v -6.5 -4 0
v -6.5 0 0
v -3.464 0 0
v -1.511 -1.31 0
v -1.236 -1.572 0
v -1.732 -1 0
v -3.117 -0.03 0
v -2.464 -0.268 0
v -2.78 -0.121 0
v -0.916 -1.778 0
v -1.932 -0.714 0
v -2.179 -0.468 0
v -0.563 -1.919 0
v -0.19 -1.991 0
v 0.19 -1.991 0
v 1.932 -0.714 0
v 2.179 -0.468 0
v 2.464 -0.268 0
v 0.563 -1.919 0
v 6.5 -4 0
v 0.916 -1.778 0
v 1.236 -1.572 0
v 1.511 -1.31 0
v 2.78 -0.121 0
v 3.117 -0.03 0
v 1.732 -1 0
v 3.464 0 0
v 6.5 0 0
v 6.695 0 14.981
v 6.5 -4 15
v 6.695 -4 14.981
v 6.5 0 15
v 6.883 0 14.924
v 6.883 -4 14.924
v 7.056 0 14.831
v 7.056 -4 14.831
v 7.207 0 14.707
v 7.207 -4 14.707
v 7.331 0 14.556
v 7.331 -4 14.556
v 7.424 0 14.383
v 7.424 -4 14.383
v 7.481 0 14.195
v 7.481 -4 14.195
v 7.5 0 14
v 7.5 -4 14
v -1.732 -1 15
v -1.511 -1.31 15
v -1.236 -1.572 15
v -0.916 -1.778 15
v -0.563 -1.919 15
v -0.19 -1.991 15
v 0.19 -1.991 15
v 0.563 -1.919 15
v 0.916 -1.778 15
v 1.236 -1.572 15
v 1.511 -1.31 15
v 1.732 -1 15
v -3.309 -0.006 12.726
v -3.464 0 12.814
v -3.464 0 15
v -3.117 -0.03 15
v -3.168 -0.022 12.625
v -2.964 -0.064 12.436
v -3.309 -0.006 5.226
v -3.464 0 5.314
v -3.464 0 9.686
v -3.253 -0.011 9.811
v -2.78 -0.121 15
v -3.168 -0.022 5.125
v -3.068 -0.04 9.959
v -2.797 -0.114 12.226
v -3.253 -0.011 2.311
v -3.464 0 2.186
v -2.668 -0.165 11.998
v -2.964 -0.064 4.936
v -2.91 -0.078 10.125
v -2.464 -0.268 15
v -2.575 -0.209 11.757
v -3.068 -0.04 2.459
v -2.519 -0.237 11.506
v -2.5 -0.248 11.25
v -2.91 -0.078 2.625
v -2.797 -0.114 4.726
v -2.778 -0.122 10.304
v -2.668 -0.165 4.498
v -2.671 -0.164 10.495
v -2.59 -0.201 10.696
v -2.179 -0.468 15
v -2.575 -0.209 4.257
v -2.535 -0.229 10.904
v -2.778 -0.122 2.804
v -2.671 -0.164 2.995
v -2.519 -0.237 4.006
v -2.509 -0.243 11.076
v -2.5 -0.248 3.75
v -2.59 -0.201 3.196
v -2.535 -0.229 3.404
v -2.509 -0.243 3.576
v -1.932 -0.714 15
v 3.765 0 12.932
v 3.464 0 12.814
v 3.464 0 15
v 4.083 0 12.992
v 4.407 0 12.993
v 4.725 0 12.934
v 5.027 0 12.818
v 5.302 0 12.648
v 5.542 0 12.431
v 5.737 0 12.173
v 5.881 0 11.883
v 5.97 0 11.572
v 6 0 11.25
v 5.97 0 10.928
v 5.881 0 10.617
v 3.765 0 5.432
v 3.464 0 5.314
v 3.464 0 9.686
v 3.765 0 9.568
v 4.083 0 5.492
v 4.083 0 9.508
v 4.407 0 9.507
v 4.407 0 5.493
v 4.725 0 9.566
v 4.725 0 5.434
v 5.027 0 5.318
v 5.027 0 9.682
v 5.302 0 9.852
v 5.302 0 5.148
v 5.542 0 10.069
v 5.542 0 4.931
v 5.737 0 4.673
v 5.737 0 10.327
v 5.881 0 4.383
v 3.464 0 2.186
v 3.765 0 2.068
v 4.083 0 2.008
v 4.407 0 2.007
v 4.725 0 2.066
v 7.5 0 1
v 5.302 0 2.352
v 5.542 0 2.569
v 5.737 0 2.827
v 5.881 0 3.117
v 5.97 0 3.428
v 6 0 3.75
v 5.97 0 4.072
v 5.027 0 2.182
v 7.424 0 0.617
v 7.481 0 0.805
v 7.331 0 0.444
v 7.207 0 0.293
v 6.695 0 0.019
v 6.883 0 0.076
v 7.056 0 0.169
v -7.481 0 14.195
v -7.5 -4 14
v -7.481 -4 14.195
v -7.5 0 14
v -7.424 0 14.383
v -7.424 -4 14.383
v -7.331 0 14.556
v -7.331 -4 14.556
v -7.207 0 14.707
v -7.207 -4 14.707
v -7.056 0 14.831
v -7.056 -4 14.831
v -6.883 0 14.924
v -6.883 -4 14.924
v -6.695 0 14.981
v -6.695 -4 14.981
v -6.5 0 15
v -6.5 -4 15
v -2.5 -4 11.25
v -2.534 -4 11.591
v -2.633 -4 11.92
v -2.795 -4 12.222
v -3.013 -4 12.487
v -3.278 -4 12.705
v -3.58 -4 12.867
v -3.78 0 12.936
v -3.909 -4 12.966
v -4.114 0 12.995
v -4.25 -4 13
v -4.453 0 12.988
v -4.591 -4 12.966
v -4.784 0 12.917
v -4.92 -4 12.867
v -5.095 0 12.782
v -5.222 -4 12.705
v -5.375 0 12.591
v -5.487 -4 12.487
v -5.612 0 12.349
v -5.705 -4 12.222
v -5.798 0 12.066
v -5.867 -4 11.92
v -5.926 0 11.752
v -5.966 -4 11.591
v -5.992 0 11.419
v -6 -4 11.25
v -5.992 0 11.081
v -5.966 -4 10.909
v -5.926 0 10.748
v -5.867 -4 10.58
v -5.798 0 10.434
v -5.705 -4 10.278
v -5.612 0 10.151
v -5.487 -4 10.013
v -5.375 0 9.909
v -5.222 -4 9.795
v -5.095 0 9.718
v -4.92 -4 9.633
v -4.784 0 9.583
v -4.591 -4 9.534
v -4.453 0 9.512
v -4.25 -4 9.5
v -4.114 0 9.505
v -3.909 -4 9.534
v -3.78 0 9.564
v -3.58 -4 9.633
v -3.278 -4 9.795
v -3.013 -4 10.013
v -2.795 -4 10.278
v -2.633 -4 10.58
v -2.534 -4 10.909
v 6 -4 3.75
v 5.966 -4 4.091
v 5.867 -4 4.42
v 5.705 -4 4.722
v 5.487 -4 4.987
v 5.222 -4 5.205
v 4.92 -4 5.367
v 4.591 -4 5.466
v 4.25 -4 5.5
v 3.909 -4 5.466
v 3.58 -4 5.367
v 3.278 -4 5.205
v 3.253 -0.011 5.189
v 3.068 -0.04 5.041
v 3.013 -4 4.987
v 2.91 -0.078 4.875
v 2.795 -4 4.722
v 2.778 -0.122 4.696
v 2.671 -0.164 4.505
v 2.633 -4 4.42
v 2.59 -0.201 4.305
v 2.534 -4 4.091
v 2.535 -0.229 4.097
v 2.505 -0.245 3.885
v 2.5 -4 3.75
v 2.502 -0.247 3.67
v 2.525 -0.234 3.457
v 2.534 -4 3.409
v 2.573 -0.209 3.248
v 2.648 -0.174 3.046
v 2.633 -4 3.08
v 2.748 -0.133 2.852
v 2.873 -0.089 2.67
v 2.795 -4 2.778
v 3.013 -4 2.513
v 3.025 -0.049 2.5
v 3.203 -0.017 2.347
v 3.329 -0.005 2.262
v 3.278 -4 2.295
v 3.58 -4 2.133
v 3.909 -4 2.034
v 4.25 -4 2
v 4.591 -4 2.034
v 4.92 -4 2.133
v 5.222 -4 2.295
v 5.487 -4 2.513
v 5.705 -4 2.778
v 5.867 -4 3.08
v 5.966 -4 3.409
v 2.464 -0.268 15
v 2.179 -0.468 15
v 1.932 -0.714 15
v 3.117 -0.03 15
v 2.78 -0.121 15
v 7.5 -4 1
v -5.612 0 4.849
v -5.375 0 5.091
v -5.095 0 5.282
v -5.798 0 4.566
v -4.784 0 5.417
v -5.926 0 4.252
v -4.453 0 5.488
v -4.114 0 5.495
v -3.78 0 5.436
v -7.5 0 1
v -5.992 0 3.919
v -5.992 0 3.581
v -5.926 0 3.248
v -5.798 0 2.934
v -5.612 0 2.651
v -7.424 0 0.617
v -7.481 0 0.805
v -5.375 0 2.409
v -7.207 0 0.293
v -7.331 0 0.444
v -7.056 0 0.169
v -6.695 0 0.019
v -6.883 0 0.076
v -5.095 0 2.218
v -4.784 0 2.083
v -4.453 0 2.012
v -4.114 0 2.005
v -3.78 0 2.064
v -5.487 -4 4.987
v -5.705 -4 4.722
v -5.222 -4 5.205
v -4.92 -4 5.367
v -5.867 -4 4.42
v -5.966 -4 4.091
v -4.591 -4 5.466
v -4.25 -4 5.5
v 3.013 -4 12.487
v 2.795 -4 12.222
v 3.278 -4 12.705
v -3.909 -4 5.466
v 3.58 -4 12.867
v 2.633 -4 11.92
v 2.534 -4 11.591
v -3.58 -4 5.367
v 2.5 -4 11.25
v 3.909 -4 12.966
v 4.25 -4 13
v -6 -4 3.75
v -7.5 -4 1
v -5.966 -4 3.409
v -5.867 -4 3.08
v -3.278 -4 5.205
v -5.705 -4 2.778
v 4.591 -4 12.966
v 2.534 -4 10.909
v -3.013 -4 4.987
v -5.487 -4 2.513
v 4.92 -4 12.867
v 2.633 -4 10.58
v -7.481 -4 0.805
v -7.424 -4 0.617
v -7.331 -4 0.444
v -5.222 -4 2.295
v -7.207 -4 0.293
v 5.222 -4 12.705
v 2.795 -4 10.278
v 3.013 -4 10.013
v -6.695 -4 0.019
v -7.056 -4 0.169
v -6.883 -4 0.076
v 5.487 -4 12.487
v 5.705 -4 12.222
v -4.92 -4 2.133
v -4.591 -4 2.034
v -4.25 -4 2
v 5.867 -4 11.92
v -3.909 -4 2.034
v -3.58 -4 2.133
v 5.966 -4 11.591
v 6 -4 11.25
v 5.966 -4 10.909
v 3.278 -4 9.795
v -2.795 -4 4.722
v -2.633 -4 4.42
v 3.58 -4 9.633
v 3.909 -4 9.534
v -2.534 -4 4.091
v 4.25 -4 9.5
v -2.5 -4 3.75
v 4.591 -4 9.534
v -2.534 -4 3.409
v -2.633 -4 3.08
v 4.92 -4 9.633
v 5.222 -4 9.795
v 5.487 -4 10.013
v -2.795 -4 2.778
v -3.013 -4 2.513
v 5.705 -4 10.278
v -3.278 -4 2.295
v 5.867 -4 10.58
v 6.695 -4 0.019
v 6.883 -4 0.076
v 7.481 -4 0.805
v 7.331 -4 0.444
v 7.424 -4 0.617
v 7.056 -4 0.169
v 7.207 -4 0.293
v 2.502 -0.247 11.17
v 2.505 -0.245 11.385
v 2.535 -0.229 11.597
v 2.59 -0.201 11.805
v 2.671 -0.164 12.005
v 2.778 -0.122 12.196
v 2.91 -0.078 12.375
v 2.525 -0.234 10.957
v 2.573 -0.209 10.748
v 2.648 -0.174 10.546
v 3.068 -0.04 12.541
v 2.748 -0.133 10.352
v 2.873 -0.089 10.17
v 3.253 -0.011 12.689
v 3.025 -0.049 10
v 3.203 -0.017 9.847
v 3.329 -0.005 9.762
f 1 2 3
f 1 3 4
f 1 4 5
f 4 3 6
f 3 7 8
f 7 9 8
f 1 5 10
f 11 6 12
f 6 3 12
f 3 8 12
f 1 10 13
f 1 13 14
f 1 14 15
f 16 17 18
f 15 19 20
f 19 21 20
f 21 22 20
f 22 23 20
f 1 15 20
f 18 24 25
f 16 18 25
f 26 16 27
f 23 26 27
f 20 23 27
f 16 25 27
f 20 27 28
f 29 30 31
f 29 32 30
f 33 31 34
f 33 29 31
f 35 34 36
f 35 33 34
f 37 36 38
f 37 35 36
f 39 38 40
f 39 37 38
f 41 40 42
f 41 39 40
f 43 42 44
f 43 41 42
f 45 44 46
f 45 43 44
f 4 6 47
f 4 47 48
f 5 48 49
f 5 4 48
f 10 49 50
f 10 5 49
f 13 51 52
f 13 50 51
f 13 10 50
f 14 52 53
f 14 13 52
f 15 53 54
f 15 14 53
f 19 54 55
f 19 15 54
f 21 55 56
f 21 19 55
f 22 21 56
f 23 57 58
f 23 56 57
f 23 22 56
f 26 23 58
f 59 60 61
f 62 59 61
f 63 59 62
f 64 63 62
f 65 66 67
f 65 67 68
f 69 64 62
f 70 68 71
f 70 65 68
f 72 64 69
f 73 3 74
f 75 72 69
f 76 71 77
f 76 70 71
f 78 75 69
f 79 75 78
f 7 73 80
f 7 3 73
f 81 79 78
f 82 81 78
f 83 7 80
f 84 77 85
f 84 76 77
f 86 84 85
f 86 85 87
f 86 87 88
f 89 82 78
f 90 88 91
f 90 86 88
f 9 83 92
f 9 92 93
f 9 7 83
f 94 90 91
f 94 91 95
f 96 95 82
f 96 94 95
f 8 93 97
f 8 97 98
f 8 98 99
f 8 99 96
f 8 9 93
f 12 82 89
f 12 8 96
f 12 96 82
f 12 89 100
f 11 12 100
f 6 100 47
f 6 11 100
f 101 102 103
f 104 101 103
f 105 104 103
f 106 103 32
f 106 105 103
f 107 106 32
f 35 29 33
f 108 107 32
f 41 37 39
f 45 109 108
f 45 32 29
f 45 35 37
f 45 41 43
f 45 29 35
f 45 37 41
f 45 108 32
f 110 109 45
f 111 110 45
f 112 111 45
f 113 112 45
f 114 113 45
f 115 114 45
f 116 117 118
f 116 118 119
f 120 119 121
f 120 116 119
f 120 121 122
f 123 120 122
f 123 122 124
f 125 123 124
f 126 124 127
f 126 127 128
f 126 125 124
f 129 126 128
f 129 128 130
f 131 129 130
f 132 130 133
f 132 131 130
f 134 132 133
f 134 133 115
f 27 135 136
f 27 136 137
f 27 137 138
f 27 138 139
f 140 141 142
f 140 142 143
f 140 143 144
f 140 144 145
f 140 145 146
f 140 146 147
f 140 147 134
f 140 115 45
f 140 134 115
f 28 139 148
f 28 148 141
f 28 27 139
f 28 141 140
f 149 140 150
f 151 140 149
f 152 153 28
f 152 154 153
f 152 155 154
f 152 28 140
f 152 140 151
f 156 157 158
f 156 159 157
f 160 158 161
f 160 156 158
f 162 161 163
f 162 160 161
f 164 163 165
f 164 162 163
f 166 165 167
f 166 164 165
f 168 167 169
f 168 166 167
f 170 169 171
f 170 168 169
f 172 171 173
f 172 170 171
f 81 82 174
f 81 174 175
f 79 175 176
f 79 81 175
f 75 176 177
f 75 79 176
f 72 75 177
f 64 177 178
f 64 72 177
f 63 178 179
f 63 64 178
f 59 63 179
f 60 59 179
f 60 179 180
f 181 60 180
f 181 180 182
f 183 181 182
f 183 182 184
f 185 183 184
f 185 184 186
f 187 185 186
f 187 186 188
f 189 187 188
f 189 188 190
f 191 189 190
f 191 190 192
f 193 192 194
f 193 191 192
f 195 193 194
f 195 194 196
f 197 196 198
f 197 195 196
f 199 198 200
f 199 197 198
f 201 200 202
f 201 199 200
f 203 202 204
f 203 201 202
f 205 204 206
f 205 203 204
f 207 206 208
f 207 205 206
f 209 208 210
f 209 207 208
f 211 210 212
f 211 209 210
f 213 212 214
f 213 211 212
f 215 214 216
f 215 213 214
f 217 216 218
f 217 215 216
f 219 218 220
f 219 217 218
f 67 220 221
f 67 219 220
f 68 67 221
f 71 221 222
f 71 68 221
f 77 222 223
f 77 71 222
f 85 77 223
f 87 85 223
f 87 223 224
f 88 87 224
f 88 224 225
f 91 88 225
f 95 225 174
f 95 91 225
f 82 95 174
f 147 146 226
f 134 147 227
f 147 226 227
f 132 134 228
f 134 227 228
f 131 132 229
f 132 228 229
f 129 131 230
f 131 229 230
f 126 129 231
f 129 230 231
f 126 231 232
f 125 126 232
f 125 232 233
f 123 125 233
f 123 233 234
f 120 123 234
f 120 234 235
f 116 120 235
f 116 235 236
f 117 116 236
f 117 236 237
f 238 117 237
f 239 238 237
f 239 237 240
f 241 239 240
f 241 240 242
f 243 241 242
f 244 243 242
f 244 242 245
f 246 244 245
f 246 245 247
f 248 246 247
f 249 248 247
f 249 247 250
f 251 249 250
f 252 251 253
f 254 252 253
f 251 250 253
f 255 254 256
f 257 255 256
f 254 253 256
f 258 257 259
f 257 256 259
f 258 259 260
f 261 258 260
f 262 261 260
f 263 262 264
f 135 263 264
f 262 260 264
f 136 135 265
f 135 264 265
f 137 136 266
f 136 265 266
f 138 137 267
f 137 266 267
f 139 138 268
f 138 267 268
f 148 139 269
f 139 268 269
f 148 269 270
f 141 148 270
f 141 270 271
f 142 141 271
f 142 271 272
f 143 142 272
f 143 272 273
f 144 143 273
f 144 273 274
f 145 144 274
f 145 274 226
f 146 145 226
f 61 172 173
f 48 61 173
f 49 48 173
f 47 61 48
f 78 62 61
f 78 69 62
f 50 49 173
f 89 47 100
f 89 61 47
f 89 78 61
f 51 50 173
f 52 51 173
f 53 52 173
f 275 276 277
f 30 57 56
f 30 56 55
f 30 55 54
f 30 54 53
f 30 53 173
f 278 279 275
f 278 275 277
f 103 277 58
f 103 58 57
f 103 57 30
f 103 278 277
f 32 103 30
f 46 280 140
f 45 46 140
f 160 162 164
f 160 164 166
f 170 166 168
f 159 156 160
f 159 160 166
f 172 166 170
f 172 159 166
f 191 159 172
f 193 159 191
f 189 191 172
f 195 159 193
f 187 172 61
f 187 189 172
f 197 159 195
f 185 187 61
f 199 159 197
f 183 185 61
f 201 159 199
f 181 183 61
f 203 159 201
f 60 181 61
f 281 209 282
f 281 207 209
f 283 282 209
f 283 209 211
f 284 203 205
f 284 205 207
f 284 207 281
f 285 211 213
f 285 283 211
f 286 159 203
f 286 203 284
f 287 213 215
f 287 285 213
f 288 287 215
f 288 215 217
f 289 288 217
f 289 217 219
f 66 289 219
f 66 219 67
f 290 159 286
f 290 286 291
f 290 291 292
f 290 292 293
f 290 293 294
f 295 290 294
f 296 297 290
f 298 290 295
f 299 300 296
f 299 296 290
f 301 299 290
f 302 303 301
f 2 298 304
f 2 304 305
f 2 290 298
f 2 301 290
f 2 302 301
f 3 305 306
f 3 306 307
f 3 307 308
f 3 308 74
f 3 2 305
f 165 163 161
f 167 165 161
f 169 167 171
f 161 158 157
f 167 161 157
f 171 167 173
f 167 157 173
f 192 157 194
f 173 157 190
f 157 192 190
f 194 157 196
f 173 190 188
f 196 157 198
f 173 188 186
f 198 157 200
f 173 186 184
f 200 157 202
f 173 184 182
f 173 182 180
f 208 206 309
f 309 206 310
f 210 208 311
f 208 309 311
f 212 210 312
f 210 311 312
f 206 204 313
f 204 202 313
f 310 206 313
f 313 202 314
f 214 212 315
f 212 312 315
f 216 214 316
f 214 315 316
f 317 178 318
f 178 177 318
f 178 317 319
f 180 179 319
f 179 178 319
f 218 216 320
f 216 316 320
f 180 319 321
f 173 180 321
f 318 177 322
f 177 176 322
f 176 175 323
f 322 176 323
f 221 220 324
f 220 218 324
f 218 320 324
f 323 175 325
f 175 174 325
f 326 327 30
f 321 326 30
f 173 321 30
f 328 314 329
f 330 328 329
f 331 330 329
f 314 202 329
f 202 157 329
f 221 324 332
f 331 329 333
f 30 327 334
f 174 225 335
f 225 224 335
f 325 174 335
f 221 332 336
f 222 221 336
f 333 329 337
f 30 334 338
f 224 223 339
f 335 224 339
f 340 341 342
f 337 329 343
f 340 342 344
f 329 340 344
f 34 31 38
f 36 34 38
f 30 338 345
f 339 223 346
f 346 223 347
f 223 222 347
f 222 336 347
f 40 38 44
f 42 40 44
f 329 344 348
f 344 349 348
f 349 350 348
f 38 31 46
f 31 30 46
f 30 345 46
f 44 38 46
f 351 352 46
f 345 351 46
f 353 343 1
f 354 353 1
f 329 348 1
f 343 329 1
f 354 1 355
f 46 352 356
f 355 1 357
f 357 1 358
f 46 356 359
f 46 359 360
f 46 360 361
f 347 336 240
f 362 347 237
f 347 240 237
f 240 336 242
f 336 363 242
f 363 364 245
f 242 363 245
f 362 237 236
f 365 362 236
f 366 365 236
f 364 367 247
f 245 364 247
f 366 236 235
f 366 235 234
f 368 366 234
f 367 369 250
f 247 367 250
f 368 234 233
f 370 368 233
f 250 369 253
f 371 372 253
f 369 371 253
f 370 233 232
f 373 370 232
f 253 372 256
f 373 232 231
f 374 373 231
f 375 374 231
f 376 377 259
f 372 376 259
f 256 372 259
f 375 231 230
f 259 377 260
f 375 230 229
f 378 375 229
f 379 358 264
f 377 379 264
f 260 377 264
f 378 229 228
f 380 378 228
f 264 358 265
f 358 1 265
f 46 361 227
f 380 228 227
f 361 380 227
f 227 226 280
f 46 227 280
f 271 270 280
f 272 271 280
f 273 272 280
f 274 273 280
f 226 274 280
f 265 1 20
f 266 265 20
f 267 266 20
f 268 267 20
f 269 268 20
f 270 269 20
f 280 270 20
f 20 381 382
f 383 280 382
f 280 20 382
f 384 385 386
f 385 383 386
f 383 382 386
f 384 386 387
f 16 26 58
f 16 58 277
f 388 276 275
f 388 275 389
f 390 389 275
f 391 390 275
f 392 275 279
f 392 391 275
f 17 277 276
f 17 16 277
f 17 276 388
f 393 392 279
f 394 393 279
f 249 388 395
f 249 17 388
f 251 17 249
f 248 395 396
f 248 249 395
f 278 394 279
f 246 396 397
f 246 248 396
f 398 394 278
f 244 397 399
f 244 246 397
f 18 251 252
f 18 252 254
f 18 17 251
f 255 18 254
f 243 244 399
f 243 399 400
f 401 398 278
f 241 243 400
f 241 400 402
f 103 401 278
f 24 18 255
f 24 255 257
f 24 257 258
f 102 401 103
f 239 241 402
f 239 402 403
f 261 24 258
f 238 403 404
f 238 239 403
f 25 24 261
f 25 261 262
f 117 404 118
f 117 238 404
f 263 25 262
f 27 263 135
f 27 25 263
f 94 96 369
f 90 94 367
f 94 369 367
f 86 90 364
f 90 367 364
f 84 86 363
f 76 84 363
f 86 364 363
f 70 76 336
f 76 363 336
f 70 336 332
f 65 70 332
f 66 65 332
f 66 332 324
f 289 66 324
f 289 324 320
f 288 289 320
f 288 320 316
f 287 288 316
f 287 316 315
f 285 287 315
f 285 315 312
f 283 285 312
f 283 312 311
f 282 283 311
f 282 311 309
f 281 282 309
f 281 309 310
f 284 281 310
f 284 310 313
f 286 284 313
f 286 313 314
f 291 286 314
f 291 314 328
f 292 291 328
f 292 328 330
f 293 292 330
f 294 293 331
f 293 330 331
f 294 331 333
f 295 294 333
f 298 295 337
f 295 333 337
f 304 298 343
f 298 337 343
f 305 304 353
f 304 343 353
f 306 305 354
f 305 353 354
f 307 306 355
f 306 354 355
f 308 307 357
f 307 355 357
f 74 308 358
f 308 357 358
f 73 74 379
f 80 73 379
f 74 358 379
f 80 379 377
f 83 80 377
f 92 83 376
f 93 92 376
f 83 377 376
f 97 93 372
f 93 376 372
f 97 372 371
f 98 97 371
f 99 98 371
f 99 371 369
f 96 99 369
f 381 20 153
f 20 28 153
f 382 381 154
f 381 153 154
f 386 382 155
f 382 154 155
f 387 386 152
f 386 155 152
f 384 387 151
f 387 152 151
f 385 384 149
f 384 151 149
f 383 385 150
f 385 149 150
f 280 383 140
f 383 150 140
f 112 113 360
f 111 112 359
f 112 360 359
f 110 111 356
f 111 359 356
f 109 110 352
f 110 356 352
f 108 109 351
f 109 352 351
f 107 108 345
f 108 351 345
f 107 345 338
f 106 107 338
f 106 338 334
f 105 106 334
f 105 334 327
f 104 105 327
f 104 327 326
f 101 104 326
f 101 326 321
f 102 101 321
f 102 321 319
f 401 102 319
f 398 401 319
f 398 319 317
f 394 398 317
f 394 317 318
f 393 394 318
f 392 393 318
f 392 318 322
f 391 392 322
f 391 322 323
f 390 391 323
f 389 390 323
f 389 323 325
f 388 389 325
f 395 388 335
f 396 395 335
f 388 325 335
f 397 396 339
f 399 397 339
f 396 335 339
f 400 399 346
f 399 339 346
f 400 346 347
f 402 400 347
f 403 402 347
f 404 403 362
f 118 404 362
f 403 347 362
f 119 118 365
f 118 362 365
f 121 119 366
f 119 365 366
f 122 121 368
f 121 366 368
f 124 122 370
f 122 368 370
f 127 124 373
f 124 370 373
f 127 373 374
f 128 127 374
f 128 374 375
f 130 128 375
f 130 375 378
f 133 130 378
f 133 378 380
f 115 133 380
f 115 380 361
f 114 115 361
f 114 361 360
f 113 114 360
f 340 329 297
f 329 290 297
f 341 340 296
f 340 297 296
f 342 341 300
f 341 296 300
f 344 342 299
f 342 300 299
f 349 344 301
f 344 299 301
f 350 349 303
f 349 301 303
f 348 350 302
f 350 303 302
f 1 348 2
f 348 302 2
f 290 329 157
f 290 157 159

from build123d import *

# Parameters (mm, degrees)
F0_W         = 15
F0_H         = 8
F2_DEPTH     = 15
F1_R         = 2
F3_DEPTH     = 20
F4_R         = 1.75
F5_DEPTH     = 15
F6_DEPTH     = 25
F8_R         = 1.75
F9_DEPTH     = 25
F10_R        = 1.75
F11_DEPTH    = 25
F7_W         = 19.053414464
F7_H         = 8.769848384
F12_DEPTH    = 25
F13_T1_DEPTH = 22.3205080757
F14_R        = 1


# Not quite as in the source:
# - a fillet or chamfer that OpenCascade refuses, or shapes differently, is made with other operations: its cross-section is extruded or revolved along the edge and cut away or added


with BuildPart() as f2:
    # F0 (on Top) → F2 (new body)
    with BuildSketch(Plane.XY):
        Rectangle(F0_W, F0_H)
    extrude(amount=F2_DEPTH)

    # F1 (on Top) → F3 (cut)
    with BuildSketch(Plane.XY):
        Circle(F1_R)
    extrude(amount=F3_DEPTH, mode=Mode.SUBTRACT)

    # F4 (on Front) → F5 (cut)
    with BuildSketch(Plane.XZ):
        with Locations((-4.25, 11.25)):
            Circle(F4_R)
    extrude(amount=F5_DEPTH, mode=Mode.SUBTRACT)

    # F4 (on Front) → F6 (cut)
    with BuildSketch(Plane.XZ):
        with Locations((-4.25, 11.25)):
            Circle(F4_R)
    extrude(amount=-F6_DEPTH, mode=Mode.SUBTRACT)

    # F8 (on face) → F9 (cut)
    with BuildSketch(Plane.XZ.offset(4)):
        with Locations((-4.25, 3.75)):
            Circle(F8_R)
    extrude(amount=-F9_DEPTH, mode=Mode.SUBTRACT)

    # F10 (on face) → F11 (cut)
    with BuildSketch(Plane.XZ.offset(4)):
        with Locations((4.25, 11.25)):
            Circle(F10_R)
        with Locations((4.25, 3.75)):
            Circle(F10_R)
    extrude(amount=-F11_DEPTH, mode=Mode.SUBTRACT)

    # F7 (on Top) → F12 (cut)
    with BuildSketch(Plane.XY):
        with Locations((0, 4.384924192)):
            Rectangle(F7_W, F7_H)
    extrude(amount=F12_DEPTH, mode=Mode.SUBTRACT)

    # F13: fillet of radius 2 on 2 edges, made by hand

    # F13_s2 → F13_t1 (cut)
    with BuildSketch(Plane.XY.offset(-3.6602540378)):
        with BuildLine():
            ThreePointArc((1.7320508076, -1), (2.4641016151, -0.2679491924), (3.4641016151, 0))
            Line((3.4641016151, 0), (2, 0))
            ThreePointArc((2, 0), (1.9318516526, -0.5176380902), (1.7320508076, -1))
        make_face()
        with BuildLine():
            ThreePointArc((-3.4641016151, 0), (-2.4641016151, -0.2679491924), (-1.7320508076, -1))
            ThreePointArc((-1.7320508076, -1), (-1.9318516526, -0.5176380902), (-2, 0))
            Line((-2, 0), (-3.4641016151, 0))
        make_face()
    extrude(amount=F13_T1_DEPTH, mode=Mode.SUBTRACT)

    # F14
    f14_edges = [f2.edges().sort_by_distance(p)[0] for p in [
        (-7.5, -2, 15),
        (-7.5, -2, 0),
        (7.5, -2, 15),
        (7.5, -2, 0),
    ]]
    fillet(f14_edges, radius=F14_R)


solid = f2.part
